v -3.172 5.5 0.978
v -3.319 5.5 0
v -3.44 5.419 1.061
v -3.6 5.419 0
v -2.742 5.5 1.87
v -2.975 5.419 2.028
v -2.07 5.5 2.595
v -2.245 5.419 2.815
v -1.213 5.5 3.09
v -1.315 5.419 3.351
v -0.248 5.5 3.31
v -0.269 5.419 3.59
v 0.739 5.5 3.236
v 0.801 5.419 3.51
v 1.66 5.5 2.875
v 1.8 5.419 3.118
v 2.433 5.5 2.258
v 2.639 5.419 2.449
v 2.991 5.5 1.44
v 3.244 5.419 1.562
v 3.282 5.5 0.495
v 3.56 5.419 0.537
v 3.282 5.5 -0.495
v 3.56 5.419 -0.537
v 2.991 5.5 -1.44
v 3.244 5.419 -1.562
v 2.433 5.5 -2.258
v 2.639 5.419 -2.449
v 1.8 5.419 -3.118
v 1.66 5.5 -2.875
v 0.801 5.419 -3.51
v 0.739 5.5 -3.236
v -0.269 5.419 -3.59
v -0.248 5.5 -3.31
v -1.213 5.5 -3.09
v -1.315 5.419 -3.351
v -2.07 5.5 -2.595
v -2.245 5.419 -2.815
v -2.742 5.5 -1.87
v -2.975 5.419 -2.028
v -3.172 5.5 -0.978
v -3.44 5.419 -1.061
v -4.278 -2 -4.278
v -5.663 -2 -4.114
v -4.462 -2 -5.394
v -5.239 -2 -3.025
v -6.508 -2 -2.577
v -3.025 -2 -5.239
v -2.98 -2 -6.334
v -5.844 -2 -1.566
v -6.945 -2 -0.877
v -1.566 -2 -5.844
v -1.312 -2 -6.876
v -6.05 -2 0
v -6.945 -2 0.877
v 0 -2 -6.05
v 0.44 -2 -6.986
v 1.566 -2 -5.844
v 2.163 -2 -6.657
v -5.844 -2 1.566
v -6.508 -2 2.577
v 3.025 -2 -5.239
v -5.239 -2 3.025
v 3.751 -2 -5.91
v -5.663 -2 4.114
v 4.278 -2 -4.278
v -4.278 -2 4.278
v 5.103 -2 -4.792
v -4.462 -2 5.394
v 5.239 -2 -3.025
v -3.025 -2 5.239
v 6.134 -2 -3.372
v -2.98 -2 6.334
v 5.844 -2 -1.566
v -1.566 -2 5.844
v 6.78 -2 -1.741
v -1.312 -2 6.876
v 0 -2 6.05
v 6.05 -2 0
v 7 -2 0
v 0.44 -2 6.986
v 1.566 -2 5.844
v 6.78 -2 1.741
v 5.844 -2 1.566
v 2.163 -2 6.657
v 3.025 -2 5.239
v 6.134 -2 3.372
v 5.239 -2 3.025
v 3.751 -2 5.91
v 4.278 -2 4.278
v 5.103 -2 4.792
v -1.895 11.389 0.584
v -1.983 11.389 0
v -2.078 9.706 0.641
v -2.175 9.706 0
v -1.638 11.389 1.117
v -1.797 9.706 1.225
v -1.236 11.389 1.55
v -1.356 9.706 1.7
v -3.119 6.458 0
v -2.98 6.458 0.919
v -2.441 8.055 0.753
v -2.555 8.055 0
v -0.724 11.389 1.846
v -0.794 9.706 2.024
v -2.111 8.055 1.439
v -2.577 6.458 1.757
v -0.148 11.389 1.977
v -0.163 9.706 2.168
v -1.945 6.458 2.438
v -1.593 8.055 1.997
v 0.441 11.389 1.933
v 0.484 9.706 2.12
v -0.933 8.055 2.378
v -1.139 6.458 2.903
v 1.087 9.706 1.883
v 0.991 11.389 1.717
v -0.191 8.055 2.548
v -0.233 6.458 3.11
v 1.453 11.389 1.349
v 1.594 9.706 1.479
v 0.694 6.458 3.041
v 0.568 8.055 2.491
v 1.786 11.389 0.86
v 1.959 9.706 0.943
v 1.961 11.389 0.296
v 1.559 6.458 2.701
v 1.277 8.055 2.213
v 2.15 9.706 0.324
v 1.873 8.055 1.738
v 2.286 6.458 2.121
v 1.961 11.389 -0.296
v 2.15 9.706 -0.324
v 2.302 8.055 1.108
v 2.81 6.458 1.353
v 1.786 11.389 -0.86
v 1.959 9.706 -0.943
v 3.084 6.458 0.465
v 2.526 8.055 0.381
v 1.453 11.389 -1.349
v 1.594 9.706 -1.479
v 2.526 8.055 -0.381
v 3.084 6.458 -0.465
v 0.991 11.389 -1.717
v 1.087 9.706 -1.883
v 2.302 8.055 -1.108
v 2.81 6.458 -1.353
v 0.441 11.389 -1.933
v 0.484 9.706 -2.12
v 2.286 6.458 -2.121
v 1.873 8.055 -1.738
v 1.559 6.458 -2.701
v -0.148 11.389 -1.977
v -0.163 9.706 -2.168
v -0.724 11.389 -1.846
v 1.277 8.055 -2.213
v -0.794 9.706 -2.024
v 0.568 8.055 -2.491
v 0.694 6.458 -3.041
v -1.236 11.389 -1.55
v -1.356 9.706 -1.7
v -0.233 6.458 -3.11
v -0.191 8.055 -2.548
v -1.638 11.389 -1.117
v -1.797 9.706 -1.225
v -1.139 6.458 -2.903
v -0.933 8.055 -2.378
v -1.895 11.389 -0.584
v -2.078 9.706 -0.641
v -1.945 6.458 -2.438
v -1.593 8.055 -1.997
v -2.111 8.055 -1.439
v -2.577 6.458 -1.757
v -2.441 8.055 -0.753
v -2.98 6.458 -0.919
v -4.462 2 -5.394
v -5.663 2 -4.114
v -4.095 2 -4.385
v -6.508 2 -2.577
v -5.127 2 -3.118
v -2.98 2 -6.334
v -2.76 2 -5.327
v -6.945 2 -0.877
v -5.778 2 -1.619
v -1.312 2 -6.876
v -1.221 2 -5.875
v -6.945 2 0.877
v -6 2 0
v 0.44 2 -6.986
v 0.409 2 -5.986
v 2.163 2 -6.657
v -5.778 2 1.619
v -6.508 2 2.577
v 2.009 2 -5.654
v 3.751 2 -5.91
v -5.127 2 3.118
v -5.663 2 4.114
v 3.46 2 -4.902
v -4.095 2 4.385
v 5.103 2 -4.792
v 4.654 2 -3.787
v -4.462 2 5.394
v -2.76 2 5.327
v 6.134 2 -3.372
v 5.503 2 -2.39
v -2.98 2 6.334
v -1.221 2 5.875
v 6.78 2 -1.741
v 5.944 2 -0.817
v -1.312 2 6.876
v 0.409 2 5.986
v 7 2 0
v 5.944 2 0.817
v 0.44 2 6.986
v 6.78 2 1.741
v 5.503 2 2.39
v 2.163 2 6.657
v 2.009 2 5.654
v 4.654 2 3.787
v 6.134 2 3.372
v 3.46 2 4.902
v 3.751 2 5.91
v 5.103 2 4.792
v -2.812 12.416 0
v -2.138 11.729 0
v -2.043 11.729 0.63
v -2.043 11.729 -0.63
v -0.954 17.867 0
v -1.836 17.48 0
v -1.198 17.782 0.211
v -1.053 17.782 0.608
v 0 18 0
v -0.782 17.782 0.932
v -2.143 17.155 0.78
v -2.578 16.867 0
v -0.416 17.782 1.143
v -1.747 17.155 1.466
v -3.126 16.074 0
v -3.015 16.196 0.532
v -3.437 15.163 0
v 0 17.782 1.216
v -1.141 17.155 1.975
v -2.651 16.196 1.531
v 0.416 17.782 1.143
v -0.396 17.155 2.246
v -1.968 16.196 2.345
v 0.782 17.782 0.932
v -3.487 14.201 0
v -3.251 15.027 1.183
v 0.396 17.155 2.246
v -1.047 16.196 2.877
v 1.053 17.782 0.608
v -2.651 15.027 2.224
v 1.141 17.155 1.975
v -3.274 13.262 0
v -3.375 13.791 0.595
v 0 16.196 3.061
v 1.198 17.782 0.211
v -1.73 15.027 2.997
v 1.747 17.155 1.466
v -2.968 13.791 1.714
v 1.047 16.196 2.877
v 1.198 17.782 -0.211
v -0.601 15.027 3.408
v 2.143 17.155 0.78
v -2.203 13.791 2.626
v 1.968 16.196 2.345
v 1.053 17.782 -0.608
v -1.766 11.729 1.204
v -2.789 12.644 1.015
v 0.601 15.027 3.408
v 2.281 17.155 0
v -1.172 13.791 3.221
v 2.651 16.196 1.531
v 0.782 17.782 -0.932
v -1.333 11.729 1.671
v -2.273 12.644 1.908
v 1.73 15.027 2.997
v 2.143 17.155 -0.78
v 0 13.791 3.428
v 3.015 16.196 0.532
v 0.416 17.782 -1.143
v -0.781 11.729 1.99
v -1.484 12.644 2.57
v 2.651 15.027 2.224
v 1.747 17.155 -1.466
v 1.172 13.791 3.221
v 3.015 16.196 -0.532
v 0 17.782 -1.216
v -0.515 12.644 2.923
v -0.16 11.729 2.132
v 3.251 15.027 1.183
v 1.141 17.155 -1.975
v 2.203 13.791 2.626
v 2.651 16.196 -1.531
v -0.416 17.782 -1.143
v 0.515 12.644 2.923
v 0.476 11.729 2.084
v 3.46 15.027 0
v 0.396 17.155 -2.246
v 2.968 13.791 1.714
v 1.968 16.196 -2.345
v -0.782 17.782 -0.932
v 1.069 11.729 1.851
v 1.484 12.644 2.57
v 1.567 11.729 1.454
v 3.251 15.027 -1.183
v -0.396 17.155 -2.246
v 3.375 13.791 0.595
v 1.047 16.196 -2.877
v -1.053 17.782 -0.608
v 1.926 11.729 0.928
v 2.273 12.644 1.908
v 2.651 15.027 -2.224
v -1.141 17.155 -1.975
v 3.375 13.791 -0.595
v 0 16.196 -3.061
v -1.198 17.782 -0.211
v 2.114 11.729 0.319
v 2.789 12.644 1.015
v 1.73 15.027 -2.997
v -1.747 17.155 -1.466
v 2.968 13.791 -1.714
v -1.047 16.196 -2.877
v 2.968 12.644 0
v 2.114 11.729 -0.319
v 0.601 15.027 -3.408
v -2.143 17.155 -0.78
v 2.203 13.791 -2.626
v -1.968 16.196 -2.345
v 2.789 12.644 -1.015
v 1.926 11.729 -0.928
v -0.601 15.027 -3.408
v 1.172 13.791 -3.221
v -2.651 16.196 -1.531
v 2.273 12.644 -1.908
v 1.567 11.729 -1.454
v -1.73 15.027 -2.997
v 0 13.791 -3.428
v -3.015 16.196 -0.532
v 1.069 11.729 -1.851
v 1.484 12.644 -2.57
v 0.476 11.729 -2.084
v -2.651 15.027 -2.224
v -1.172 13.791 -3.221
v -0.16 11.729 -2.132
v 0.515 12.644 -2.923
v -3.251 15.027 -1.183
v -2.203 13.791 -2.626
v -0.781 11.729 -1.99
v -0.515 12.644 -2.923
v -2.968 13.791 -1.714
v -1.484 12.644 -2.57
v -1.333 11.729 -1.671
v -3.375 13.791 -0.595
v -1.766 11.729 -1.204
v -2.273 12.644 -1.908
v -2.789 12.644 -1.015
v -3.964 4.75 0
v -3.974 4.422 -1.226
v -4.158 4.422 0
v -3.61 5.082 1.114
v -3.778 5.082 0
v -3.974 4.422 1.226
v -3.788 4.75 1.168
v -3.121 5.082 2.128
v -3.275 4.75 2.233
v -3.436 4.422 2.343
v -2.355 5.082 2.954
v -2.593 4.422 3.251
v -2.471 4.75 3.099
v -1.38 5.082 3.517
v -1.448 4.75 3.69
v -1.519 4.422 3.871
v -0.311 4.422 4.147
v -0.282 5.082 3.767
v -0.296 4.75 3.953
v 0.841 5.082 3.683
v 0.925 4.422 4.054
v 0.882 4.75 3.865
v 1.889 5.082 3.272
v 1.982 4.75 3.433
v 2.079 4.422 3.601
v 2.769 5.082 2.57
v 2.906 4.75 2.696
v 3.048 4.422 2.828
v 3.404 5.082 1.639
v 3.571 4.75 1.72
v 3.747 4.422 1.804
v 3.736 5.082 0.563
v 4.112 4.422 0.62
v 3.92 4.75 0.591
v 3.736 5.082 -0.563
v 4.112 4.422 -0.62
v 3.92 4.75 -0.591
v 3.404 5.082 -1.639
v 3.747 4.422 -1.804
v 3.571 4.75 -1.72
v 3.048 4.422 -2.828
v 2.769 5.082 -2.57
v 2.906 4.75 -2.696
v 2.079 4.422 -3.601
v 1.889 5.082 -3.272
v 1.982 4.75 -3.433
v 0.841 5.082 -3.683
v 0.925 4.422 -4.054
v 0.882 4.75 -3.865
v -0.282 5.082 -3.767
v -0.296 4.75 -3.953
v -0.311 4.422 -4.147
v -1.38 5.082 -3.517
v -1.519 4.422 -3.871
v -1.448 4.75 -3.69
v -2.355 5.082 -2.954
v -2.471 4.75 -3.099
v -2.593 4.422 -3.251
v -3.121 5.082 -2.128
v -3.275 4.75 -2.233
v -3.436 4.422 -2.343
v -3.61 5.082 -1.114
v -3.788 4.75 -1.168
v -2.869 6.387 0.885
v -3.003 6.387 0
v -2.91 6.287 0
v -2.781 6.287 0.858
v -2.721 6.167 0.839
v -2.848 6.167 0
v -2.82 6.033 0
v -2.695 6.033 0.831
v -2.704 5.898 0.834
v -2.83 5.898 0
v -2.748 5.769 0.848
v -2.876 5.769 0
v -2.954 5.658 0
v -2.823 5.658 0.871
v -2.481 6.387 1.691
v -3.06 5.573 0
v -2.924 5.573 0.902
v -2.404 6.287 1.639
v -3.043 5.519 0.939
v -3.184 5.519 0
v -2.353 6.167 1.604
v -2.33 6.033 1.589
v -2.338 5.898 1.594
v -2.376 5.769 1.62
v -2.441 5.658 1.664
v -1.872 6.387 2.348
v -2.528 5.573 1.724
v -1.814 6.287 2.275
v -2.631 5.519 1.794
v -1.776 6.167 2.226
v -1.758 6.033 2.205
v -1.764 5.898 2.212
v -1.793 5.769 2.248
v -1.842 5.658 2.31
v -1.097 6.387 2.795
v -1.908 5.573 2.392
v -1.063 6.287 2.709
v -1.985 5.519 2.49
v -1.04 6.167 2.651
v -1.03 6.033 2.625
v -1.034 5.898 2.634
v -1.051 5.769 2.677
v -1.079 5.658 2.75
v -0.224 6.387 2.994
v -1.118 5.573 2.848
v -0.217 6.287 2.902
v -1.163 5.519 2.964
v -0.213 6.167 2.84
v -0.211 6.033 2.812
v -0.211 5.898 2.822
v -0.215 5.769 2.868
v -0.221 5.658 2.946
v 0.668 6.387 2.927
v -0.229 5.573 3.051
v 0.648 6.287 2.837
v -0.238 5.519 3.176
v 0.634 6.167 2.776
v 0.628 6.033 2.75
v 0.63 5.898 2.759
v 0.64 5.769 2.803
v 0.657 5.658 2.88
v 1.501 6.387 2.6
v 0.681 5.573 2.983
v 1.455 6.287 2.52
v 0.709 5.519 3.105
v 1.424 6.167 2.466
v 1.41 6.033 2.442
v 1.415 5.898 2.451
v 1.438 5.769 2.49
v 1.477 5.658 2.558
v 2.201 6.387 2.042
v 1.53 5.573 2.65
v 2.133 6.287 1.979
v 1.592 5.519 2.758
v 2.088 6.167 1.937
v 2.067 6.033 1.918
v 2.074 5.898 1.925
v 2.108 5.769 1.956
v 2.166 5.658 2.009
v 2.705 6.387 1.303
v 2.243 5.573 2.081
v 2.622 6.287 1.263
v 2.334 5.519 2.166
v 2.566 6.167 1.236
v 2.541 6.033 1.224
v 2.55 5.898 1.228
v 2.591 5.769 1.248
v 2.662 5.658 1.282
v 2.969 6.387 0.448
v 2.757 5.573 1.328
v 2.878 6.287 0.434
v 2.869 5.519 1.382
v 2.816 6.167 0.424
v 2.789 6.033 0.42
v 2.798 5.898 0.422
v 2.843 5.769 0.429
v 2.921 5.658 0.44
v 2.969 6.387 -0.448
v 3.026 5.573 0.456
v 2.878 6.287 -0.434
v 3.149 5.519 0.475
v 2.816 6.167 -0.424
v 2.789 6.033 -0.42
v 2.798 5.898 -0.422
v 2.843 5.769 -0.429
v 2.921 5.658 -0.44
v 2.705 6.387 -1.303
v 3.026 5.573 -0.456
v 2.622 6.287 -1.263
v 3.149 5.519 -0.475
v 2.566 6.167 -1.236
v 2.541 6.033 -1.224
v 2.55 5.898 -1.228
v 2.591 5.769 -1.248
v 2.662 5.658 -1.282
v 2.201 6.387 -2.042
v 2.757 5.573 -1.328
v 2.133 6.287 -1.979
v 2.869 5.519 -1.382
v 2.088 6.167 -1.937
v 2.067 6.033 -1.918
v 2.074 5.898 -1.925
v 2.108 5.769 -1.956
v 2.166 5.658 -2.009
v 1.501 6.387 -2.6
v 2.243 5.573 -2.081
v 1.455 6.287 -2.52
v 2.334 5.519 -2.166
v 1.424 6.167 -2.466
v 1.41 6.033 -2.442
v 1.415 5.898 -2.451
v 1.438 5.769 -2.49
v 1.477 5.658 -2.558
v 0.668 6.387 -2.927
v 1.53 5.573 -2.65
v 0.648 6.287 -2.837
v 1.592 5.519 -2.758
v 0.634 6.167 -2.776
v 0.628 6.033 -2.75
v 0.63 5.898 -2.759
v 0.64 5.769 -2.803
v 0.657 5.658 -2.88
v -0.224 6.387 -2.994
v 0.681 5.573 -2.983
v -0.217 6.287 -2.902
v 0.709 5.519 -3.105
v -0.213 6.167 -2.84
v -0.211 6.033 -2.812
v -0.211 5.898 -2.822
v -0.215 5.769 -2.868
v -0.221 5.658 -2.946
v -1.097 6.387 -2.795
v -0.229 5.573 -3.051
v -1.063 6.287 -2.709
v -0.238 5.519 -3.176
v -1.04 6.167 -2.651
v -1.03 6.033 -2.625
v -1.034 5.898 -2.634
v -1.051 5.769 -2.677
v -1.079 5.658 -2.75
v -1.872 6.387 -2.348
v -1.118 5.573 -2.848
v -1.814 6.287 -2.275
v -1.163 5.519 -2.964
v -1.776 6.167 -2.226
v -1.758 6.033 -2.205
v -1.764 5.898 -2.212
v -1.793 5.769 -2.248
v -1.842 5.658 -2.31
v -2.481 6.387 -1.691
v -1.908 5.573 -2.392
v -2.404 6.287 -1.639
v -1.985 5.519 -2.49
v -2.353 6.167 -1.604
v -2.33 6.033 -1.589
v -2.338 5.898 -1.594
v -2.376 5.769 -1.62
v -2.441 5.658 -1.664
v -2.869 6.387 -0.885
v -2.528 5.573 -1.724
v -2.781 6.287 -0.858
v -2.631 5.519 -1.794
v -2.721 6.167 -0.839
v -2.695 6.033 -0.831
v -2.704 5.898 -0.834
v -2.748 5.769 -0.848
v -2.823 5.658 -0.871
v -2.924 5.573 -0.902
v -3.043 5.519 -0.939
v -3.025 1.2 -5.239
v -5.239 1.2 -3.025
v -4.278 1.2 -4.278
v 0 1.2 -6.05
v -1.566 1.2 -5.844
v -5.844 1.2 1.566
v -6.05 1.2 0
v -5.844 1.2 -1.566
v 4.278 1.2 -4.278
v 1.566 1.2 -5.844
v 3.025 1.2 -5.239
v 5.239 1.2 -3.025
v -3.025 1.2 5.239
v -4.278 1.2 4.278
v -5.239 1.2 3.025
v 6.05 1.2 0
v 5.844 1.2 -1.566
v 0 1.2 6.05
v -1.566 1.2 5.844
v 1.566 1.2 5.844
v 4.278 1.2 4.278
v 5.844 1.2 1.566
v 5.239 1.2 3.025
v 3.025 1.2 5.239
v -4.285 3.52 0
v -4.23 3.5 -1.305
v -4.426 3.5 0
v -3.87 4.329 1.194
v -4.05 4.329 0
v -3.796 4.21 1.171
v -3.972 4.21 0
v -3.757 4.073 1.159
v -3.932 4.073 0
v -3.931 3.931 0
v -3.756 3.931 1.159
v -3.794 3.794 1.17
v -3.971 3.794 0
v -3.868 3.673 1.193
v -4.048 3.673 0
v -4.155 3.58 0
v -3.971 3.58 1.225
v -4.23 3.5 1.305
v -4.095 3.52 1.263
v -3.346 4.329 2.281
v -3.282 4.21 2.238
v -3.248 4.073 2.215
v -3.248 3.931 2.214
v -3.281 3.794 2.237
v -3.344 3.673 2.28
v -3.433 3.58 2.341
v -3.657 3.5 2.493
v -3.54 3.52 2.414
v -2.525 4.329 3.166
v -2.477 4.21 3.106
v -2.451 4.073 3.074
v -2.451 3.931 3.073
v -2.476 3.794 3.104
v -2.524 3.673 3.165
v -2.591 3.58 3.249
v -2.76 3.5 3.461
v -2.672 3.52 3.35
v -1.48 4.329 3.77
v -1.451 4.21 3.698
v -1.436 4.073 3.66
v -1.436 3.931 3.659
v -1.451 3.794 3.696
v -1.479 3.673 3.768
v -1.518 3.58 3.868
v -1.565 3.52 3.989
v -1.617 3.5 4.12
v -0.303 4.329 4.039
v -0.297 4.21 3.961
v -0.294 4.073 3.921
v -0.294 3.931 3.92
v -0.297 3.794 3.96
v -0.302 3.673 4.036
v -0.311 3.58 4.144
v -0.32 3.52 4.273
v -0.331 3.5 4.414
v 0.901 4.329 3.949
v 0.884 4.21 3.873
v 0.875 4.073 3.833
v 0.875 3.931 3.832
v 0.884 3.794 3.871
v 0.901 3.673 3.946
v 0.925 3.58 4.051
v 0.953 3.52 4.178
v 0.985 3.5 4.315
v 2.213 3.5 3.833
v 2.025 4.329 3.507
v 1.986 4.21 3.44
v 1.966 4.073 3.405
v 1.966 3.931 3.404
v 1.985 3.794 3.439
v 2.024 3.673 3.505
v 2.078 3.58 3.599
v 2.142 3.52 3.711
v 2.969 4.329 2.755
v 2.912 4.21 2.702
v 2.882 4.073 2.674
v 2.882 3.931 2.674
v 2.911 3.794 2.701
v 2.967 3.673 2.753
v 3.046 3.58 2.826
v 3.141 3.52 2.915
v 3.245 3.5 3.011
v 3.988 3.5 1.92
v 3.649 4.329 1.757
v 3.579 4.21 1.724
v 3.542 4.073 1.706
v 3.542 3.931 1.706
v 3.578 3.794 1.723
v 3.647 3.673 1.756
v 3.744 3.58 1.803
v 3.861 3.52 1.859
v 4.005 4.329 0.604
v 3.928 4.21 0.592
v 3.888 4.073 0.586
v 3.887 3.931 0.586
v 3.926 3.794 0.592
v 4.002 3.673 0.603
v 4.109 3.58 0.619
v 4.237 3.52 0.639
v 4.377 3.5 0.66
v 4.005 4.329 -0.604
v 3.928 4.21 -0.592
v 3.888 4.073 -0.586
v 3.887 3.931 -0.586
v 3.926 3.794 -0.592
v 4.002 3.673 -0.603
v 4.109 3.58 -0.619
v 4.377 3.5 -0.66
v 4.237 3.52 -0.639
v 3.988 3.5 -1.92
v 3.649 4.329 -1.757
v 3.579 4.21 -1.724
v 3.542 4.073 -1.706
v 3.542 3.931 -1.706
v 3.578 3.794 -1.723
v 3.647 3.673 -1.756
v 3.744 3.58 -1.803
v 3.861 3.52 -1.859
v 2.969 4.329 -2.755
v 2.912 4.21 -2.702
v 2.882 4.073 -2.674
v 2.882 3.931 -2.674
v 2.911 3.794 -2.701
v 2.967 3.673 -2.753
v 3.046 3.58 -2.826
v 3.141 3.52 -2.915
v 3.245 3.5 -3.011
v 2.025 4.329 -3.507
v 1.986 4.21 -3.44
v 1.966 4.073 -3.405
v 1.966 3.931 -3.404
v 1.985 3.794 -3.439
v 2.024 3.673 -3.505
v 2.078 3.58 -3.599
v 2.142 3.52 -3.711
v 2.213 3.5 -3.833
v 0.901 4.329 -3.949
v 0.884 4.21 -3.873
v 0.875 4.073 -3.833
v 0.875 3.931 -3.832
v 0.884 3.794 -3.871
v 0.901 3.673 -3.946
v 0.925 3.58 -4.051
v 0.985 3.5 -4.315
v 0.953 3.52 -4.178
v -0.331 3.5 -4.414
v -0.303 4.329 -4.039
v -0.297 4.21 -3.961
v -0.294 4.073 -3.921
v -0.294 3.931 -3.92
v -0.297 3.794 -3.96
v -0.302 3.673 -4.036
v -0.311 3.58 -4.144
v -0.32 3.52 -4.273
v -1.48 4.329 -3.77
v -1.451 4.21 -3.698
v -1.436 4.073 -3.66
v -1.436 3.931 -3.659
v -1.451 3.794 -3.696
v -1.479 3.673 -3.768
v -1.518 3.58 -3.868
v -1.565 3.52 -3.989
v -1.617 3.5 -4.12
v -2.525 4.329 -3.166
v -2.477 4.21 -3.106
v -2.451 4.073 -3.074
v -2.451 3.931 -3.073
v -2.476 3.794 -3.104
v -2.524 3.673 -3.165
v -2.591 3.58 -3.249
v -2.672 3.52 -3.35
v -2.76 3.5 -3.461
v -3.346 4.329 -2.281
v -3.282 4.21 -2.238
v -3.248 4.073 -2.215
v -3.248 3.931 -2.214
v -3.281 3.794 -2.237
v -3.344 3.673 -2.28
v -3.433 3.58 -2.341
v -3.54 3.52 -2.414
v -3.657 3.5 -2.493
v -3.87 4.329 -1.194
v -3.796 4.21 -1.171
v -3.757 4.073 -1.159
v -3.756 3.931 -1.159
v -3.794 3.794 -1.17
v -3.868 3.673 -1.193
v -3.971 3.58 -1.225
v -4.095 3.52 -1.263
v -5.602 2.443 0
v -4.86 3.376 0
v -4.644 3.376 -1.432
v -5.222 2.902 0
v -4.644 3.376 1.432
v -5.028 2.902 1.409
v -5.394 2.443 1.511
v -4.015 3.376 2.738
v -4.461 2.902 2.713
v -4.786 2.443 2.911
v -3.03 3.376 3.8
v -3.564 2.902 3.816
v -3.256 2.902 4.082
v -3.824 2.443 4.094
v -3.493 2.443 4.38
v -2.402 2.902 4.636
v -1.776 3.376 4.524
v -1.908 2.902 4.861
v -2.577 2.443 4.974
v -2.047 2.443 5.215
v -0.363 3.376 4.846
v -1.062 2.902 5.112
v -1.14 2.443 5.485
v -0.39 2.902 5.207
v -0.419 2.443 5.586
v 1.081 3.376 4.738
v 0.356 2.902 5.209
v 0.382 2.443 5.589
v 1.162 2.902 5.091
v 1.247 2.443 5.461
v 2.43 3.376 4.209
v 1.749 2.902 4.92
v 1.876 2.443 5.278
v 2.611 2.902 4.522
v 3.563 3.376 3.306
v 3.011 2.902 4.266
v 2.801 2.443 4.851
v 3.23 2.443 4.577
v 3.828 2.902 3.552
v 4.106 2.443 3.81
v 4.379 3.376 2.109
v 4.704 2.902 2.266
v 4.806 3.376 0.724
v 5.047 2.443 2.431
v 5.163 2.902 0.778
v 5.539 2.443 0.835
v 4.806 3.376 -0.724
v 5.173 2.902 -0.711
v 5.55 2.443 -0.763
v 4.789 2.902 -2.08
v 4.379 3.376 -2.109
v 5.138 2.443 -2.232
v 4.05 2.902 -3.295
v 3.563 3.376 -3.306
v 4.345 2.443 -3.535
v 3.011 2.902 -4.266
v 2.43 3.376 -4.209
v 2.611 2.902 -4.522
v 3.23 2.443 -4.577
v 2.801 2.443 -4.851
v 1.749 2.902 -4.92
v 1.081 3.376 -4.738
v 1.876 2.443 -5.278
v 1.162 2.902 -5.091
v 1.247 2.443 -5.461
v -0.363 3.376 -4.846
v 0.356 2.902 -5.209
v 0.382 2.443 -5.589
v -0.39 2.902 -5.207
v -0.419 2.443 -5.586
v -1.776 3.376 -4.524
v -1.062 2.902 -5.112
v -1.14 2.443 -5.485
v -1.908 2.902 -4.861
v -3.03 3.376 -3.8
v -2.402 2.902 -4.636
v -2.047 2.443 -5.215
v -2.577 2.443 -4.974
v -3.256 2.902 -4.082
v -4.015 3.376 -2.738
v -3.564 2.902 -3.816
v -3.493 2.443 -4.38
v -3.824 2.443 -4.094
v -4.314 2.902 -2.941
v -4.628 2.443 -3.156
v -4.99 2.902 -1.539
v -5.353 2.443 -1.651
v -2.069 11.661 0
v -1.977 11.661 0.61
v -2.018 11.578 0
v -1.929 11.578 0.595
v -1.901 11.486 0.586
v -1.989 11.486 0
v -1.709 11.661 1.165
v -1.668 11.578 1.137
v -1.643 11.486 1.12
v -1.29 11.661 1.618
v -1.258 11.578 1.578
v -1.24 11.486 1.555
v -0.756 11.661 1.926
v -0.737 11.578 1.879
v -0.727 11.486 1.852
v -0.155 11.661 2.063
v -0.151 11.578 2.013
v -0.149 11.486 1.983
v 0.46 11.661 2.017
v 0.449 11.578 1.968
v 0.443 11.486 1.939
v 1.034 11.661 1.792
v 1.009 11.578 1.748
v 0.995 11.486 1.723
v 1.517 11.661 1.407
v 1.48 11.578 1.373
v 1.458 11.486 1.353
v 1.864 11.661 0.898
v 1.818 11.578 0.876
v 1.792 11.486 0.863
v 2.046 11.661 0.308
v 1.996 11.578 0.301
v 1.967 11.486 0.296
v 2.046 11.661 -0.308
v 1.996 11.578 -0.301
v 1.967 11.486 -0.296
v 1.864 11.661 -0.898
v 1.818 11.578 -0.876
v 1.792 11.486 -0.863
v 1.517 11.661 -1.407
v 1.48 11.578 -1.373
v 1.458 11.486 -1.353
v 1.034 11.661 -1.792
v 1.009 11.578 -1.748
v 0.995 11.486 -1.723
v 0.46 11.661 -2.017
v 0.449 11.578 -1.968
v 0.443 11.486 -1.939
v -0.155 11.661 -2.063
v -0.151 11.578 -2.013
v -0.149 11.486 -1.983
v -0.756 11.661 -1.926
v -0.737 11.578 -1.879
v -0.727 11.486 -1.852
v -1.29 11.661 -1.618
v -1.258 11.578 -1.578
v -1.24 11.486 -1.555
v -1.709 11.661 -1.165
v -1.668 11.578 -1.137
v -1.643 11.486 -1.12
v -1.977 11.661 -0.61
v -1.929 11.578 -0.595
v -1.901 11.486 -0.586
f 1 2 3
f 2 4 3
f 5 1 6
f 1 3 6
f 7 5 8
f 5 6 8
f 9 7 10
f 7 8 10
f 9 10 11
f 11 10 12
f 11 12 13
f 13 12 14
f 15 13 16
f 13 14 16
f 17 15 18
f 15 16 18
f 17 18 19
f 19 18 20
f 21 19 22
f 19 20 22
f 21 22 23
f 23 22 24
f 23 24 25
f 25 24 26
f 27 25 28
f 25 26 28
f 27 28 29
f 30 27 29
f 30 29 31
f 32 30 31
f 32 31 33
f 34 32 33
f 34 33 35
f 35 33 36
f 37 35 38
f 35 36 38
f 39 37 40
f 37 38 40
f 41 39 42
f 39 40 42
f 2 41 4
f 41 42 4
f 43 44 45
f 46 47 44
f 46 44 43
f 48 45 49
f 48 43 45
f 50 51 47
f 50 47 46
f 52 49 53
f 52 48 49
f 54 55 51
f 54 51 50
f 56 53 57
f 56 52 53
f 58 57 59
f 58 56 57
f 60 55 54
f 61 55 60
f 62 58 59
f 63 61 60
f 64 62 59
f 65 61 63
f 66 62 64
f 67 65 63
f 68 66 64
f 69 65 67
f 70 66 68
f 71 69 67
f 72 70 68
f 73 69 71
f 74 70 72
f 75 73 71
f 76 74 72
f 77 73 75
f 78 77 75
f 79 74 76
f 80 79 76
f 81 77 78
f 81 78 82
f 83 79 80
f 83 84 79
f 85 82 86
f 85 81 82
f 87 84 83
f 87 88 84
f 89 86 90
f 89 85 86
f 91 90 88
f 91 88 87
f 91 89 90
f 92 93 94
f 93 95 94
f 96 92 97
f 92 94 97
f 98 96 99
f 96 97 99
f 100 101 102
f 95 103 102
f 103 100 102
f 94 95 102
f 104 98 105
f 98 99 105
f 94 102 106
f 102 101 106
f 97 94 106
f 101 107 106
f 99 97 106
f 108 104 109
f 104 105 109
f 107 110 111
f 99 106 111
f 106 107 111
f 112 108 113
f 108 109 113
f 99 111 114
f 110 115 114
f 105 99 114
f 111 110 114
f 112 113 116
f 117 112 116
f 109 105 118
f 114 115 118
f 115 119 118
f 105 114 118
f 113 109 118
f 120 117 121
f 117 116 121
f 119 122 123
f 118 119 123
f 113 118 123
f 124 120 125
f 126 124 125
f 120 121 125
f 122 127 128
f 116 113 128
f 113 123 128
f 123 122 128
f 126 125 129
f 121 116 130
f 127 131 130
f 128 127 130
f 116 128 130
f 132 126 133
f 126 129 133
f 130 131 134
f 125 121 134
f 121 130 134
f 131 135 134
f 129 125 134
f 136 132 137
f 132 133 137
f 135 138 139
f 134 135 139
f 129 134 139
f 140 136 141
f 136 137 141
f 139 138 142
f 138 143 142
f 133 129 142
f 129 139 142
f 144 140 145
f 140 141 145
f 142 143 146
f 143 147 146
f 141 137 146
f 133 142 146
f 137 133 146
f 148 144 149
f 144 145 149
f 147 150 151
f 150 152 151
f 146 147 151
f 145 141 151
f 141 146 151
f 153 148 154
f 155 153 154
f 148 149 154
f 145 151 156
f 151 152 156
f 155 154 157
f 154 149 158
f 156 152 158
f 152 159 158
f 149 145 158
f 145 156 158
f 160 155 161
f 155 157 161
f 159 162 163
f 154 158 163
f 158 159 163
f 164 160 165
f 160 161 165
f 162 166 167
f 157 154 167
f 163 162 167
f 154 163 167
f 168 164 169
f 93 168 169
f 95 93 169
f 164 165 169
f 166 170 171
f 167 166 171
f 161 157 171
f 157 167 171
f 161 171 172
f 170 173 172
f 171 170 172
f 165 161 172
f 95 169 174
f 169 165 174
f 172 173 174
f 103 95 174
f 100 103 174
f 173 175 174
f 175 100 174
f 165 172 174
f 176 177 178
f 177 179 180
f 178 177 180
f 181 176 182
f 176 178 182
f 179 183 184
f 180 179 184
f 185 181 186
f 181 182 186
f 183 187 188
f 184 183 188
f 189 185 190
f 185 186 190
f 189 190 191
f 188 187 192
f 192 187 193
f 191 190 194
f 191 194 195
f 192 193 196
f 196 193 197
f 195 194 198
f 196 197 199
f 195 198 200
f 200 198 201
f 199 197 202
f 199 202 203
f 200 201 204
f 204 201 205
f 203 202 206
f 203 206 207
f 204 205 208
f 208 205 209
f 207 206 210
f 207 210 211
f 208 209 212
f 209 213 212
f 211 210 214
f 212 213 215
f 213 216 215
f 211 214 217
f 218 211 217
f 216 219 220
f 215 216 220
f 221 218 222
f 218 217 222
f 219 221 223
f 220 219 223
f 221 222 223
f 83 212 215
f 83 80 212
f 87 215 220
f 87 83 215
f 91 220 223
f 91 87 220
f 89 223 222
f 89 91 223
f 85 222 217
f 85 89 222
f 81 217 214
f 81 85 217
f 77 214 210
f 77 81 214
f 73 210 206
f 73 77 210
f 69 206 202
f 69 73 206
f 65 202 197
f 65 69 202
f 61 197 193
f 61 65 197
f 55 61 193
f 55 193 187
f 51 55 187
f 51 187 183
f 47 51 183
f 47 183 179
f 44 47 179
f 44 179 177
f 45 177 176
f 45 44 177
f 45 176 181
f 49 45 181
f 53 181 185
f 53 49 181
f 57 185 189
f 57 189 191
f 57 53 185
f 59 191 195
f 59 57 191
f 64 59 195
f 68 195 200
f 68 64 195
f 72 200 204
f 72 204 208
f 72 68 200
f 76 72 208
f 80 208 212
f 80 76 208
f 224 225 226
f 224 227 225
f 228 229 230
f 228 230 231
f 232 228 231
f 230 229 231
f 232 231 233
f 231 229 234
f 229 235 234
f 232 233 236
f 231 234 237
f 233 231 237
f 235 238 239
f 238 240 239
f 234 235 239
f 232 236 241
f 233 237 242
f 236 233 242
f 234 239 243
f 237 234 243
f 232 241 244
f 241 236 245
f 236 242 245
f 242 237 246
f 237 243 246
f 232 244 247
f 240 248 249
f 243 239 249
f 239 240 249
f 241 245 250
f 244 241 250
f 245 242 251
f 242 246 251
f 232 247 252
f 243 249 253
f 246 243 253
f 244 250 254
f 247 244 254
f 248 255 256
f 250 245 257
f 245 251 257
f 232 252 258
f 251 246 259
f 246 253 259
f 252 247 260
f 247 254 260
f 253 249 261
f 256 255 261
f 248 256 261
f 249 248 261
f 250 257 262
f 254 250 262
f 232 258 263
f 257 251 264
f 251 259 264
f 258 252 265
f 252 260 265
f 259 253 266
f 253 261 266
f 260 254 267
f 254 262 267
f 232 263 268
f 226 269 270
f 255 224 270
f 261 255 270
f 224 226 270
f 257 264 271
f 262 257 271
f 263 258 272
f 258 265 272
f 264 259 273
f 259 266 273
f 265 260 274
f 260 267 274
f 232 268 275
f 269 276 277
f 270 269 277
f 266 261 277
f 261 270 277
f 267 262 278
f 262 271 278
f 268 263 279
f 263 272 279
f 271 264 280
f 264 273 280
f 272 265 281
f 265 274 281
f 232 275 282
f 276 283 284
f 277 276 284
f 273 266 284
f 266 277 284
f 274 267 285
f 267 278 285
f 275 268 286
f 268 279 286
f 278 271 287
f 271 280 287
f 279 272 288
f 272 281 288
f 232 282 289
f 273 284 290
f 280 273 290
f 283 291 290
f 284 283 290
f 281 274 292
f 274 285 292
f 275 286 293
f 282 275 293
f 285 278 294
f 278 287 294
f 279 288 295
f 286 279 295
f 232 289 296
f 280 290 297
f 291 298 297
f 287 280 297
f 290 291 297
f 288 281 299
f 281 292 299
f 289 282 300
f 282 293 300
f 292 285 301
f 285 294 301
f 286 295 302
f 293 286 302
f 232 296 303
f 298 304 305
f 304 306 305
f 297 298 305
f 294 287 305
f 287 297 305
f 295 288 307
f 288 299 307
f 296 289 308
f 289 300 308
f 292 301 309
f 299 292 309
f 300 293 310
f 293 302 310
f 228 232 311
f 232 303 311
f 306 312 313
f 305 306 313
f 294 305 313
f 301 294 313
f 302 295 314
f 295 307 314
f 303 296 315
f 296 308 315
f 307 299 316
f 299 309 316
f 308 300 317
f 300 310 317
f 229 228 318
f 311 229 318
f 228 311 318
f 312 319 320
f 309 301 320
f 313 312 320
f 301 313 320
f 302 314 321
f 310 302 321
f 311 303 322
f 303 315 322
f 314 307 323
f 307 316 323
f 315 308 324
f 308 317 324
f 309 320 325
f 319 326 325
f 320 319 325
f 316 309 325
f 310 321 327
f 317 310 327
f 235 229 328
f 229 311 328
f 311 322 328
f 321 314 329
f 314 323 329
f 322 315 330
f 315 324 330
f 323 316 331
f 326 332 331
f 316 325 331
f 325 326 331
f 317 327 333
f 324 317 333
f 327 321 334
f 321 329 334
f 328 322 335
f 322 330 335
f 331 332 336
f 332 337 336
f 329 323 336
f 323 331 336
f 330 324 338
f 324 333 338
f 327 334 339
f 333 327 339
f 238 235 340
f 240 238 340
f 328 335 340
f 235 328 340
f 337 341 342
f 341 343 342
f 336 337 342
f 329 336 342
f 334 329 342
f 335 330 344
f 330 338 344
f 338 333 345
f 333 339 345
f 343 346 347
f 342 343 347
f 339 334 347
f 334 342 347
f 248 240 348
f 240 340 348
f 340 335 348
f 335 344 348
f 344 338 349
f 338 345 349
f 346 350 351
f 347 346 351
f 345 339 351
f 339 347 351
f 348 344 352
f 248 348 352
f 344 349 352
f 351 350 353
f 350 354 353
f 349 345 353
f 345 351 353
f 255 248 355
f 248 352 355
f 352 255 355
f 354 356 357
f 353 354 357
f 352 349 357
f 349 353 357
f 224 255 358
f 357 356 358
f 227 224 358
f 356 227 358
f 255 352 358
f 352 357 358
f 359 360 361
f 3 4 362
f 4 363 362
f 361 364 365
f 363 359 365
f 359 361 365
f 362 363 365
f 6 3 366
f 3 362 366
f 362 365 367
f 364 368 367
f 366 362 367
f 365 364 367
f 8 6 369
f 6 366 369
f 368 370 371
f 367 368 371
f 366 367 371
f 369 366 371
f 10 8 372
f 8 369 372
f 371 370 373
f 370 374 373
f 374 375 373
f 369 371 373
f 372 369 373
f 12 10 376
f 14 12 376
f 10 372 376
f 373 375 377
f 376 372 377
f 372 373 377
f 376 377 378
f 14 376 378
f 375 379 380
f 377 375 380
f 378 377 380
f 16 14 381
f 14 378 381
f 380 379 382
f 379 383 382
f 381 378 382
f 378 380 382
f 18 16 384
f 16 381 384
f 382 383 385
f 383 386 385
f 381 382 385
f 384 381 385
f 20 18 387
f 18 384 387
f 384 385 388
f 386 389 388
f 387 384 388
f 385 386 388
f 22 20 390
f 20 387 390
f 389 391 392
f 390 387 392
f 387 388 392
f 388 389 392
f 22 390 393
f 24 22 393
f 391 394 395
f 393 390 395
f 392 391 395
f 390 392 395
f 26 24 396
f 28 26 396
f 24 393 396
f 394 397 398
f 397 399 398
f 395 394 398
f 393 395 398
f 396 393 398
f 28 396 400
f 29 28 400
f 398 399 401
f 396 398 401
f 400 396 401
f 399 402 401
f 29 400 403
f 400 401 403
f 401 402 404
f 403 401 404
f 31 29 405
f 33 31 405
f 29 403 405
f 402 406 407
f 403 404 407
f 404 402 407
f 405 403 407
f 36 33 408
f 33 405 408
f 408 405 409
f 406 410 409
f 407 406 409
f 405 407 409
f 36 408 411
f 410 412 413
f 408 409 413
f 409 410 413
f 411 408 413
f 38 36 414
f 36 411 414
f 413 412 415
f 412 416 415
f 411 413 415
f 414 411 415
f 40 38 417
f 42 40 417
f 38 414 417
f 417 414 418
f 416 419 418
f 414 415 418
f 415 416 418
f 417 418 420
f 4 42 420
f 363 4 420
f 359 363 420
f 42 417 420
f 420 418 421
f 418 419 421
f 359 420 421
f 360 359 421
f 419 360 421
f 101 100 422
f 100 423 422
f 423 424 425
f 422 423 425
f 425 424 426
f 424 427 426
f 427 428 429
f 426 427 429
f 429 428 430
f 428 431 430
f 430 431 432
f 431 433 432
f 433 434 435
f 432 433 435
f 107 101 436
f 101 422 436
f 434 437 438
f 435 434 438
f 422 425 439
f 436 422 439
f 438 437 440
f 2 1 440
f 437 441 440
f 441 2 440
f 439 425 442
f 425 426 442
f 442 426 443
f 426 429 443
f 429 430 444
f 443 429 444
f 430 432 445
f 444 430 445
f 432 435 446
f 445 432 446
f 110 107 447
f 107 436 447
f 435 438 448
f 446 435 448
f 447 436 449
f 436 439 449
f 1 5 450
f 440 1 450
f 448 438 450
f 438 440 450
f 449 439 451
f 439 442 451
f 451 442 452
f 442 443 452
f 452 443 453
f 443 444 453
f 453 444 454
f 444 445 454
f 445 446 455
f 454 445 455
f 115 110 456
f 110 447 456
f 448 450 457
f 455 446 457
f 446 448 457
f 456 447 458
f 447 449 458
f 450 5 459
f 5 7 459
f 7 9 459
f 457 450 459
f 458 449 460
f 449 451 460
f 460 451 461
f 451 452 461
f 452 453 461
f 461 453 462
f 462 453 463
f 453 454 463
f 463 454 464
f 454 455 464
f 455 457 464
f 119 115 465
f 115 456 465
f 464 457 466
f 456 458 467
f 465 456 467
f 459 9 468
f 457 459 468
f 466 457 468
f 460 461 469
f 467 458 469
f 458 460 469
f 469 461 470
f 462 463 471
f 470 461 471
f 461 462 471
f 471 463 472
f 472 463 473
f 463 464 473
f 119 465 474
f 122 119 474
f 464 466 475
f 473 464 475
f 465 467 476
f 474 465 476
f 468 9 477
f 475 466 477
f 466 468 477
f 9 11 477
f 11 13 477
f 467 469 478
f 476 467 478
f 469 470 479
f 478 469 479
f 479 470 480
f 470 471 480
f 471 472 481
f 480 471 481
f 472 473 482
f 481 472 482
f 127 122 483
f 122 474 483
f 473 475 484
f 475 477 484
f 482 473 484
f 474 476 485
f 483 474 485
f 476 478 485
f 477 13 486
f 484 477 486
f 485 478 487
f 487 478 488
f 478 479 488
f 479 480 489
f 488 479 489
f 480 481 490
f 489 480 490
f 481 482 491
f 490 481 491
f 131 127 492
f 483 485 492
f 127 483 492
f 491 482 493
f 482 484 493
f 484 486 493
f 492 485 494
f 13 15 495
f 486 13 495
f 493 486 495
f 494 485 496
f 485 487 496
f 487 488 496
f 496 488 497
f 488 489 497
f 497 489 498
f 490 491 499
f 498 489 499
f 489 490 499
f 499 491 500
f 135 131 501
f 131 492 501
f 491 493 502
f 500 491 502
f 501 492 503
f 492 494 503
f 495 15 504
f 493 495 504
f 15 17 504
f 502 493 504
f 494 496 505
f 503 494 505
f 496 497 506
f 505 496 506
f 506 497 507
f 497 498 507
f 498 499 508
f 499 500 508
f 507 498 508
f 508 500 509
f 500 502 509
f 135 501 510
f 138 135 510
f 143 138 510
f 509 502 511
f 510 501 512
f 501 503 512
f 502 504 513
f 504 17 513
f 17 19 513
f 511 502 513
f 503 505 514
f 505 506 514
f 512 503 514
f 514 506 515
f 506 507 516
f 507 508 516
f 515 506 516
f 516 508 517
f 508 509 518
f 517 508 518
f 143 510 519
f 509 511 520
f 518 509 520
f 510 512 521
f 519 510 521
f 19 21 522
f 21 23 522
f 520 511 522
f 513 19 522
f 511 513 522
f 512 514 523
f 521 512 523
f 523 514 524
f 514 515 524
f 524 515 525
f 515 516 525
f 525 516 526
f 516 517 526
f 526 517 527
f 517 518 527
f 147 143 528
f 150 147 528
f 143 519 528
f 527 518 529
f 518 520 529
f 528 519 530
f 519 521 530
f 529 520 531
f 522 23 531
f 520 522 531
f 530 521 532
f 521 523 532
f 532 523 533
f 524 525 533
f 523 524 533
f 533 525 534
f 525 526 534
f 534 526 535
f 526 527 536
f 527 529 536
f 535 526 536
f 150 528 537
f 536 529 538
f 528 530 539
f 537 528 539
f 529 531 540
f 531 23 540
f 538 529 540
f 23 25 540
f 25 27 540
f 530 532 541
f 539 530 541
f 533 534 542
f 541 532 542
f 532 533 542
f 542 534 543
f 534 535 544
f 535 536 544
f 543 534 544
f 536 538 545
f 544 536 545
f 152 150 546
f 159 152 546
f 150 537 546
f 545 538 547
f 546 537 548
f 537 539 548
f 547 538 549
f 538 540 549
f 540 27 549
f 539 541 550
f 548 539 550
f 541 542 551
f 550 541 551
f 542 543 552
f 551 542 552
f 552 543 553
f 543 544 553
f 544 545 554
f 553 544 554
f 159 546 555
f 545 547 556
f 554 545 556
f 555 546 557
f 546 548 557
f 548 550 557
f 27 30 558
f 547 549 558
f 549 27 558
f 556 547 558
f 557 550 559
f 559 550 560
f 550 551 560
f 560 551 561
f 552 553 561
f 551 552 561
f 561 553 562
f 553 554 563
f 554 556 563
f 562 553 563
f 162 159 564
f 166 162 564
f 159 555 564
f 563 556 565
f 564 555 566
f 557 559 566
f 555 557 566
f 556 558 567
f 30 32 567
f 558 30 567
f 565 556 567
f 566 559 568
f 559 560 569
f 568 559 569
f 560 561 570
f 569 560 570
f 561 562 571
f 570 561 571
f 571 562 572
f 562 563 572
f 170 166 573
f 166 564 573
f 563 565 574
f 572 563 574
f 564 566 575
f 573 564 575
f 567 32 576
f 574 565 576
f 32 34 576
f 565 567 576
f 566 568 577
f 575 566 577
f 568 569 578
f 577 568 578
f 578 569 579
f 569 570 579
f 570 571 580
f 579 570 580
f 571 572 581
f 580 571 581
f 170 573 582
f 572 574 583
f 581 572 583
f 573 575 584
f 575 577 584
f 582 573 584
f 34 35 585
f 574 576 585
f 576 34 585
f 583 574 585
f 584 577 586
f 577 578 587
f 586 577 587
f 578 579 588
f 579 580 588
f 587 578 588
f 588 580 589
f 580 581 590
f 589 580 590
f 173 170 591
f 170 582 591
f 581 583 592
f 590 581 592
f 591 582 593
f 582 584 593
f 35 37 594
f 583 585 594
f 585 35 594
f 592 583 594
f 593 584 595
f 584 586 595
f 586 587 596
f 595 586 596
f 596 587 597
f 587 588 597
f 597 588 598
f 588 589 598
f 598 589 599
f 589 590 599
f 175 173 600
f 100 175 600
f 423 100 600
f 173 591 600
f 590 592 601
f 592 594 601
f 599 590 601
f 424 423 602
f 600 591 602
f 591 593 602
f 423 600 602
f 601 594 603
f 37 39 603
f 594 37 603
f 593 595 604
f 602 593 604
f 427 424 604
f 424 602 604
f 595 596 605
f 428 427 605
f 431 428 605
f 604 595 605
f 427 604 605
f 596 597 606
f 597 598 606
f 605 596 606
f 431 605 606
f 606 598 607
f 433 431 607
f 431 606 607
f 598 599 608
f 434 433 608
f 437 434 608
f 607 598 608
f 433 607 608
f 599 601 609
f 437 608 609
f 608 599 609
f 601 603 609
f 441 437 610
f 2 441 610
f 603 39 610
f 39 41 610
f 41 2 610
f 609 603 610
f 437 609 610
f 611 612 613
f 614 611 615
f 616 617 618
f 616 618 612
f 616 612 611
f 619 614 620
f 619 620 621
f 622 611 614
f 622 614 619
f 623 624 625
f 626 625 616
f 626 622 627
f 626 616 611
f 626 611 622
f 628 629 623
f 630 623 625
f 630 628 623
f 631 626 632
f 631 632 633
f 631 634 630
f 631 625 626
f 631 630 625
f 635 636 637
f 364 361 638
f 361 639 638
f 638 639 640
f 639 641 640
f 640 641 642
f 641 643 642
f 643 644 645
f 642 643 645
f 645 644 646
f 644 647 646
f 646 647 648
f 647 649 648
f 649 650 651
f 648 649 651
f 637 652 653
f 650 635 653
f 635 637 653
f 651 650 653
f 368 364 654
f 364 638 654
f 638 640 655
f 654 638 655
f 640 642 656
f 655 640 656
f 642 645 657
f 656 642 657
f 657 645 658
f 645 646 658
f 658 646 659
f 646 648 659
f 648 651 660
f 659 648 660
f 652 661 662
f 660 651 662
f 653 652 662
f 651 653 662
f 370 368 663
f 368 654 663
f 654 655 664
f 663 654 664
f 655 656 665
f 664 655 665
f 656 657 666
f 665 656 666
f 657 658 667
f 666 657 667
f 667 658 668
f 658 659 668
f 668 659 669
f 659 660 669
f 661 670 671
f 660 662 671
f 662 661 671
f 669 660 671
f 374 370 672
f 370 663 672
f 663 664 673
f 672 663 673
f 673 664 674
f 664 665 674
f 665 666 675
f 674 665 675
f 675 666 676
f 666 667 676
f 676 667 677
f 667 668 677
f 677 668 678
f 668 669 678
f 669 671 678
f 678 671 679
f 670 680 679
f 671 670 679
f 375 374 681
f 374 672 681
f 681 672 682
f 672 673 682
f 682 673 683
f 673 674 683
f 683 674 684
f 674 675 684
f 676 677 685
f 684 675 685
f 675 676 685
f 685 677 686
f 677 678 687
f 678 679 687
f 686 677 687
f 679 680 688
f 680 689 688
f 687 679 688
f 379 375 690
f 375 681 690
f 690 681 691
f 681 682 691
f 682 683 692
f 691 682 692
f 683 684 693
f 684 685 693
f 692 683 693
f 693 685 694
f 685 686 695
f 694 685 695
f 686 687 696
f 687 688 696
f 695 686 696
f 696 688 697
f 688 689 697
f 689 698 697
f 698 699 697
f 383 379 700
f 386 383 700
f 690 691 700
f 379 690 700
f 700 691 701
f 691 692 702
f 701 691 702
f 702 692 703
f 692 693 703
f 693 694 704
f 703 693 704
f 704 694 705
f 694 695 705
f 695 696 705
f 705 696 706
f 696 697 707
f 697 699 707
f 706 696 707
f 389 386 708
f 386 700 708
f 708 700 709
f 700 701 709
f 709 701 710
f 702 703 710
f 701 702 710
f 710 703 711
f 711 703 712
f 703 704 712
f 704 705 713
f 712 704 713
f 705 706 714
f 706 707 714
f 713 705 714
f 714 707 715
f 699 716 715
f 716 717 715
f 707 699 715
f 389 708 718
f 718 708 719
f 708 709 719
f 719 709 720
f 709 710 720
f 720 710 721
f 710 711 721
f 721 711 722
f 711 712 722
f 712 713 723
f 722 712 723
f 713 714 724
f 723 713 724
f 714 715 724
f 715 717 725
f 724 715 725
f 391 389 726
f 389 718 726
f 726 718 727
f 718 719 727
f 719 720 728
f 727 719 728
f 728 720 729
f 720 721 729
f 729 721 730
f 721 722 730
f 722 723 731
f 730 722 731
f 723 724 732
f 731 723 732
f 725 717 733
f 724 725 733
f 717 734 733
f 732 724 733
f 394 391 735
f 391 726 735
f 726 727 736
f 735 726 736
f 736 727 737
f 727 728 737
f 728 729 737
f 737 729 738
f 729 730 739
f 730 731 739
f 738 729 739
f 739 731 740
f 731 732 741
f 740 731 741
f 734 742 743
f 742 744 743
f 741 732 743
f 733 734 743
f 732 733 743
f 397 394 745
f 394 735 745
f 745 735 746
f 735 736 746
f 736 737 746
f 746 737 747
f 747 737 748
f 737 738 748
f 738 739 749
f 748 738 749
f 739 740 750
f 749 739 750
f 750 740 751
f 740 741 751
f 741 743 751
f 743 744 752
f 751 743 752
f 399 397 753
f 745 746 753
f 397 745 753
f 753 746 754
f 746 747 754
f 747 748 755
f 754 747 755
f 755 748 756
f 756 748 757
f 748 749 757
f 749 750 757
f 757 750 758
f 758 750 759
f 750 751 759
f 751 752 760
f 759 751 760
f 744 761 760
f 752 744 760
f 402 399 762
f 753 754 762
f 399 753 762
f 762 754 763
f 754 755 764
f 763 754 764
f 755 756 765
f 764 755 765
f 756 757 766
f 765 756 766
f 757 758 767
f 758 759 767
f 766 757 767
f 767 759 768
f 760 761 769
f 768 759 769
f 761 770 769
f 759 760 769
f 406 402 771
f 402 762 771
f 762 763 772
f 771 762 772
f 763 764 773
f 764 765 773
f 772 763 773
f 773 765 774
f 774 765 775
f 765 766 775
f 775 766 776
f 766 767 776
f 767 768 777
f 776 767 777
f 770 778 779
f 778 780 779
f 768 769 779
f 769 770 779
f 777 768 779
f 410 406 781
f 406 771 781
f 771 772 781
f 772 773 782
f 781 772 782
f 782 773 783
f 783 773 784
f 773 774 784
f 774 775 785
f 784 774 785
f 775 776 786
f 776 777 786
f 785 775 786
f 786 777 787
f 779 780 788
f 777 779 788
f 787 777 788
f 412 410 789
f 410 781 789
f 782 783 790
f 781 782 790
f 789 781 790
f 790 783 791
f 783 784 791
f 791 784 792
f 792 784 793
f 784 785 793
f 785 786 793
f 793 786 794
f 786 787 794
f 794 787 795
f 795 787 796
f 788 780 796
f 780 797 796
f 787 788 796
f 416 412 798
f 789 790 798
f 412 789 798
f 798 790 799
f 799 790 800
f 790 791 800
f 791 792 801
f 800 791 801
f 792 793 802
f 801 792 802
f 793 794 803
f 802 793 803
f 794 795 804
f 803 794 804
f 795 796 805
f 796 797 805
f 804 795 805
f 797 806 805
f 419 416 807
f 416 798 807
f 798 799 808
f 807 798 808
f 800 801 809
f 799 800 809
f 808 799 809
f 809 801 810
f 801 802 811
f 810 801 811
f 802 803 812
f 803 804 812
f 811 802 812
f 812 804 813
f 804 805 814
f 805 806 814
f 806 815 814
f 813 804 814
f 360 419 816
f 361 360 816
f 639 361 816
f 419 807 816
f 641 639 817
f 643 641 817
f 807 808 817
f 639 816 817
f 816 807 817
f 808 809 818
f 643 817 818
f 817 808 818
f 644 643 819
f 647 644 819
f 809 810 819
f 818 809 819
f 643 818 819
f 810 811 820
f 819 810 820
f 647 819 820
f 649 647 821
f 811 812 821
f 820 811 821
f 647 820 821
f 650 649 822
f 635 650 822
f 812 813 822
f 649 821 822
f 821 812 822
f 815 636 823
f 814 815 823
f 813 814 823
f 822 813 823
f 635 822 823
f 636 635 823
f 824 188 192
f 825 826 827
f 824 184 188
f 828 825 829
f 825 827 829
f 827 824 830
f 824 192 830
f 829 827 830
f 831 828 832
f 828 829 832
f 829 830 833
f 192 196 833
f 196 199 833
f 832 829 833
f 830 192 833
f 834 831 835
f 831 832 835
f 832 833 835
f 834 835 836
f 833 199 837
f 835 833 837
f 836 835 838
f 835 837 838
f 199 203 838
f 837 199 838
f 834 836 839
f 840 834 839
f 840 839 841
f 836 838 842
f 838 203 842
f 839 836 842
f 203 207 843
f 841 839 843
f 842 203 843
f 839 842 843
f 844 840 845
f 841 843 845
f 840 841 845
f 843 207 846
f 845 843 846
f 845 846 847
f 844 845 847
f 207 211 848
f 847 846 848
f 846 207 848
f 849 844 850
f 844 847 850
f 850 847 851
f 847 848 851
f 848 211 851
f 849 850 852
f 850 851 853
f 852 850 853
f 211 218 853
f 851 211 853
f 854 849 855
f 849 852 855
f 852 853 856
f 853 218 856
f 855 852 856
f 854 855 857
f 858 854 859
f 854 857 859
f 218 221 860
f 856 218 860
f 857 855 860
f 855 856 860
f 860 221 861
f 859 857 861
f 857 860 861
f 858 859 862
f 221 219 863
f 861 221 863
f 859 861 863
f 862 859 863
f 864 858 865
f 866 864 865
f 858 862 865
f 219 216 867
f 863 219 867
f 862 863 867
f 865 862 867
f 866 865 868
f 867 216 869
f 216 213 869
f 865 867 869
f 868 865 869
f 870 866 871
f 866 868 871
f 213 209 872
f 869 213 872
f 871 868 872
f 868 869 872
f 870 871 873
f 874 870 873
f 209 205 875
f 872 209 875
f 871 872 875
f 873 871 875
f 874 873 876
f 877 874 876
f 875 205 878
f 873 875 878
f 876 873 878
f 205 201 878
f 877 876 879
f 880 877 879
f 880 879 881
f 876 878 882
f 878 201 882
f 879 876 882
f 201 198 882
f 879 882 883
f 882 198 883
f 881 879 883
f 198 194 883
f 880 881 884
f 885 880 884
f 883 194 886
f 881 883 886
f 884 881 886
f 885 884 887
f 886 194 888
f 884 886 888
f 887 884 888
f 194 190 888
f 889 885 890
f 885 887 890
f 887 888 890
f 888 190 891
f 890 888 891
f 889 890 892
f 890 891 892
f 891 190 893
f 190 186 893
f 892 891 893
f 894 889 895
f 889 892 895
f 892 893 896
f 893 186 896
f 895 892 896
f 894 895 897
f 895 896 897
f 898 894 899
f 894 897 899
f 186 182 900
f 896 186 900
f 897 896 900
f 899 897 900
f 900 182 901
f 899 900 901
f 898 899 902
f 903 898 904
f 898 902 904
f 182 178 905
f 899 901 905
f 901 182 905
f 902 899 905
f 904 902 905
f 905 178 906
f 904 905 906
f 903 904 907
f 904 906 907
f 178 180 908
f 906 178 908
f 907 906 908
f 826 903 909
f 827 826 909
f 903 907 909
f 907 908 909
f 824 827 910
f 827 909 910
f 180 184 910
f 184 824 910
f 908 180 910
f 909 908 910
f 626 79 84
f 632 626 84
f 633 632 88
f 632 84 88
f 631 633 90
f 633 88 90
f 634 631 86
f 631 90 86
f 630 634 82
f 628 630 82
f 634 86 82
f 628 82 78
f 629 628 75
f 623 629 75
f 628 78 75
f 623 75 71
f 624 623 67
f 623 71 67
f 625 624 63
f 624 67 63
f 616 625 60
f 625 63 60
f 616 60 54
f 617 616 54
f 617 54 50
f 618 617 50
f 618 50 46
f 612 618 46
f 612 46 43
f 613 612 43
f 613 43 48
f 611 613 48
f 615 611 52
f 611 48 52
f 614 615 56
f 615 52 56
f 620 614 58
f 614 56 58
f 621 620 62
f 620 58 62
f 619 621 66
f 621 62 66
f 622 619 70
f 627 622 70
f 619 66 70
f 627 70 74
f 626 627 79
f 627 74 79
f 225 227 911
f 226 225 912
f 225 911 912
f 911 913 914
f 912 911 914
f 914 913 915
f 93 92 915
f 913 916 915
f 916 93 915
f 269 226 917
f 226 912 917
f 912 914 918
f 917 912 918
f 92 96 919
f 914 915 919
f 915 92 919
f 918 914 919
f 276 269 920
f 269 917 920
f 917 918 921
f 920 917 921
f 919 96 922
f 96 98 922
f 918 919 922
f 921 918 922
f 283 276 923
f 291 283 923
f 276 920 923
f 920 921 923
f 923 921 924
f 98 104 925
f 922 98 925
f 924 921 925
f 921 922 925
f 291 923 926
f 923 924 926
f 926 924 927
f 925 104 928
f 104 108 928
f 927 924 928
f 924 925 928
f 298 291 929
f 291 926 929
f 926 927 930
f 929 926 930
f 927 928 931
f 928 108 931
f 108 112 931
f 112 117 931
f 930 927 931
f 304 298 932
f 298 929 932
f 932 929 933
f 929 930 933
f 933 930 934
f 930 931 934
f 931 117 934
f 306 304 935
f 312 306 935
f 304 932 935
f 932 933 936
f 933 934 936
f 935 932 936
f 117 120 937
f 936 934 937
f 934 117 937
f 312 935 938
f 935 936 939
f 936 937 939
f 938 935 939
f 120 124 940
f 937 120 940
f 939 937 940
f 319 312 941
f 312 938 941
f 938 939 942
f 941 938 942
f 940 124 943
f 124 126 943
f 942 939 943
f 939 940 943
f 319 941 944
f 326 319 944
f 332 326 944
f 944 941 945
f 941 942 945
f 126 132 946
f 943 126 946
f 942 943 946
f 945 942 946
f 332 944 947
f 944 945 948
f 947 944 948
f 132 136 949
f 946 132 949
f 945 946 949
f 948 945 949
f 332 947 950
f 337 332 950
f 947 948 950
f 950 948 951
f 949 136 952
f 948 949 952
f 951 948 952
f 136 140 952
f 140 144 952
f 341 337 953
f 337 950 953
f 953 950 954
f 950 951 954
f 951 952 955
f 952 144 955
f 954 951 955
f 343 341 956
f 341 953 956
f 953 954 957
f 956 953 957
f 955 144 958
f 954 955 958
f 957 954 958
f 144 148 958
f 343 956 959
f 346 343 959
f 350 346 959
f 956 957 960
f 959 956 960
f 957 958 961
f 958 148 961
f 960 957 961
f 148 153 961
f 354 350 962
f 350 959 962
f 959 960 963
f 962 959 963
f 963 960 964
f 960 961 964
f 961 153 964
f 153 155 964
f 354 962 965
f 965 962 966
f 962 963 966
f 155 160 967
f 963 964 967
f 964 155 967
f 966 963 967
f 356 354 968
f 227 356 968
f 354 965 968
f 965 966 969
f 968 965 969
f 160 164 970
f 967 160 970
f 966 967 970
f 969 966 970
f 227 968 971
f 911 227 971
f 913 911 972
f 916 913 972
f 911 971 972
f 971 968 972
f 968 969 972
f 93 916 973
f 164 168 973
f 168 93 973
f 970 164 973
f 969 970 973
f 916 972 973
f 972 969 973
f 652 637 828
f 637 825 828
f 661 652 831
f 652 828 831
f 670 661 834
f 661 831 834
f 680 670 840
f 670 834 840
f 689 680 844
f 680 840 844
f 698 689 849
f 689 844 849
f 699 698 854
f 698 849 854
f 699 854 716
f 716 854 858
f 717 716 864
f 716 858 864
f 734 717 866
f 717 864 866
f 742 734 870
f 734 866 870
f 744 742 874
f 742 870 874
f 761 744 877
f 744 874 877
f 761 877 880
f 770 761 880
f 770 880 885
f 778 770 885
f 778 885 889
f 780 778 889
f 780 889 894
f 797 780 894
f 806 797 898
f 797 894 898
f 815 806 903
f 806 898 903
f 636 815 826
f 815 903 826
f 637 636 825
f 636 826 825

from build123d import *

# Parameters (mm, degrees)
SKETCH3_R           = 7
BOSS_EXTRUDE1_DEPTH = 2
BOSS_EXTRUDE2_START = -2
SKETCH3_3_R         = 7
BOSS_EXTRUDE2_DEPTH = 2
SKETCH5_R           = 6.05
CUT_EXTRUDE1_DEPTH  = 3.2


with BuildPart() as part:
    # Esboço1 → Revolução1 (revolve)
    with BuildSketch(Plane.XY):
        with BuildLine():
            Line((-6, 0), (0, 0))
            Line((0, 0), (0, 18))
            ThreePointArc((0, 18), (-3.312799908, 15.629316948), (-2.13782919, 11.728775297))
            ThreePointArc((-2.13782919, 11.728775297), (-2.018299709, 11.578229866), (-1.98280027, 11.389309212))
            ThreePointArc((-1.98280027, 11.389309212), (-2.341324967, 8.875429394), (-3.118754256, 6.458047463))
            ThreePointArc((-3.118754256, 6.458047463), (-2.829835487, 5.897588408), (-3.319234982, 5.5))
            Line((-3.319234982, 5.5), (-3.6002073, 5.419432484))
            ThreePointArc((-3.6002073, 5.419432484), (-3.869815727, 4.915531149), (-4.158423427, 4.422265648))
            ThreePointArc((-4.158423427, 4.422265648), (-3.946003212, 3.860595596), (-4.426176527, 3.5))
            Line((-4.426176527, 3.5), (-4.85988246, 3.375636825))
            ThreePointArc((-4.85988246, 3.375636825), (-5.409441117, 2.670828072), (-6, 2))
            Line((-6, 2), (-6, 0))
        make_face()
    revolve(axis=Axis((0, -3.799835873, 0), (0, 1, 0)))

    # Sketch3 → Boss-Extrude1 (add)
    with BuildSketch(Plane.XZ):
        Circle(SKETCH3_R)
    extrude(amount=BOSS_EXTRUDE1_DEPTH)

    # Sketch3<3> → Boss-Extrude2 (add)
    with BuildSketch(Plane.XZ.offset(BOSS_EXTRUDE2_START)):
        Circle(SKETCH3_3_R)
    extrude(amount=BOSS_EXTRUDE2_DEPTH)

    # Sketch5 → Cut-Extrude1 (cut)
    with BuildSketch(Plane.XZ.offset(2)):
        Circle(SKETCH5_R)
    extrude(amount=-CUT_EXTRUDE1_DEPTH, mode=Mode.SUBTRACT)


solid = part.part
